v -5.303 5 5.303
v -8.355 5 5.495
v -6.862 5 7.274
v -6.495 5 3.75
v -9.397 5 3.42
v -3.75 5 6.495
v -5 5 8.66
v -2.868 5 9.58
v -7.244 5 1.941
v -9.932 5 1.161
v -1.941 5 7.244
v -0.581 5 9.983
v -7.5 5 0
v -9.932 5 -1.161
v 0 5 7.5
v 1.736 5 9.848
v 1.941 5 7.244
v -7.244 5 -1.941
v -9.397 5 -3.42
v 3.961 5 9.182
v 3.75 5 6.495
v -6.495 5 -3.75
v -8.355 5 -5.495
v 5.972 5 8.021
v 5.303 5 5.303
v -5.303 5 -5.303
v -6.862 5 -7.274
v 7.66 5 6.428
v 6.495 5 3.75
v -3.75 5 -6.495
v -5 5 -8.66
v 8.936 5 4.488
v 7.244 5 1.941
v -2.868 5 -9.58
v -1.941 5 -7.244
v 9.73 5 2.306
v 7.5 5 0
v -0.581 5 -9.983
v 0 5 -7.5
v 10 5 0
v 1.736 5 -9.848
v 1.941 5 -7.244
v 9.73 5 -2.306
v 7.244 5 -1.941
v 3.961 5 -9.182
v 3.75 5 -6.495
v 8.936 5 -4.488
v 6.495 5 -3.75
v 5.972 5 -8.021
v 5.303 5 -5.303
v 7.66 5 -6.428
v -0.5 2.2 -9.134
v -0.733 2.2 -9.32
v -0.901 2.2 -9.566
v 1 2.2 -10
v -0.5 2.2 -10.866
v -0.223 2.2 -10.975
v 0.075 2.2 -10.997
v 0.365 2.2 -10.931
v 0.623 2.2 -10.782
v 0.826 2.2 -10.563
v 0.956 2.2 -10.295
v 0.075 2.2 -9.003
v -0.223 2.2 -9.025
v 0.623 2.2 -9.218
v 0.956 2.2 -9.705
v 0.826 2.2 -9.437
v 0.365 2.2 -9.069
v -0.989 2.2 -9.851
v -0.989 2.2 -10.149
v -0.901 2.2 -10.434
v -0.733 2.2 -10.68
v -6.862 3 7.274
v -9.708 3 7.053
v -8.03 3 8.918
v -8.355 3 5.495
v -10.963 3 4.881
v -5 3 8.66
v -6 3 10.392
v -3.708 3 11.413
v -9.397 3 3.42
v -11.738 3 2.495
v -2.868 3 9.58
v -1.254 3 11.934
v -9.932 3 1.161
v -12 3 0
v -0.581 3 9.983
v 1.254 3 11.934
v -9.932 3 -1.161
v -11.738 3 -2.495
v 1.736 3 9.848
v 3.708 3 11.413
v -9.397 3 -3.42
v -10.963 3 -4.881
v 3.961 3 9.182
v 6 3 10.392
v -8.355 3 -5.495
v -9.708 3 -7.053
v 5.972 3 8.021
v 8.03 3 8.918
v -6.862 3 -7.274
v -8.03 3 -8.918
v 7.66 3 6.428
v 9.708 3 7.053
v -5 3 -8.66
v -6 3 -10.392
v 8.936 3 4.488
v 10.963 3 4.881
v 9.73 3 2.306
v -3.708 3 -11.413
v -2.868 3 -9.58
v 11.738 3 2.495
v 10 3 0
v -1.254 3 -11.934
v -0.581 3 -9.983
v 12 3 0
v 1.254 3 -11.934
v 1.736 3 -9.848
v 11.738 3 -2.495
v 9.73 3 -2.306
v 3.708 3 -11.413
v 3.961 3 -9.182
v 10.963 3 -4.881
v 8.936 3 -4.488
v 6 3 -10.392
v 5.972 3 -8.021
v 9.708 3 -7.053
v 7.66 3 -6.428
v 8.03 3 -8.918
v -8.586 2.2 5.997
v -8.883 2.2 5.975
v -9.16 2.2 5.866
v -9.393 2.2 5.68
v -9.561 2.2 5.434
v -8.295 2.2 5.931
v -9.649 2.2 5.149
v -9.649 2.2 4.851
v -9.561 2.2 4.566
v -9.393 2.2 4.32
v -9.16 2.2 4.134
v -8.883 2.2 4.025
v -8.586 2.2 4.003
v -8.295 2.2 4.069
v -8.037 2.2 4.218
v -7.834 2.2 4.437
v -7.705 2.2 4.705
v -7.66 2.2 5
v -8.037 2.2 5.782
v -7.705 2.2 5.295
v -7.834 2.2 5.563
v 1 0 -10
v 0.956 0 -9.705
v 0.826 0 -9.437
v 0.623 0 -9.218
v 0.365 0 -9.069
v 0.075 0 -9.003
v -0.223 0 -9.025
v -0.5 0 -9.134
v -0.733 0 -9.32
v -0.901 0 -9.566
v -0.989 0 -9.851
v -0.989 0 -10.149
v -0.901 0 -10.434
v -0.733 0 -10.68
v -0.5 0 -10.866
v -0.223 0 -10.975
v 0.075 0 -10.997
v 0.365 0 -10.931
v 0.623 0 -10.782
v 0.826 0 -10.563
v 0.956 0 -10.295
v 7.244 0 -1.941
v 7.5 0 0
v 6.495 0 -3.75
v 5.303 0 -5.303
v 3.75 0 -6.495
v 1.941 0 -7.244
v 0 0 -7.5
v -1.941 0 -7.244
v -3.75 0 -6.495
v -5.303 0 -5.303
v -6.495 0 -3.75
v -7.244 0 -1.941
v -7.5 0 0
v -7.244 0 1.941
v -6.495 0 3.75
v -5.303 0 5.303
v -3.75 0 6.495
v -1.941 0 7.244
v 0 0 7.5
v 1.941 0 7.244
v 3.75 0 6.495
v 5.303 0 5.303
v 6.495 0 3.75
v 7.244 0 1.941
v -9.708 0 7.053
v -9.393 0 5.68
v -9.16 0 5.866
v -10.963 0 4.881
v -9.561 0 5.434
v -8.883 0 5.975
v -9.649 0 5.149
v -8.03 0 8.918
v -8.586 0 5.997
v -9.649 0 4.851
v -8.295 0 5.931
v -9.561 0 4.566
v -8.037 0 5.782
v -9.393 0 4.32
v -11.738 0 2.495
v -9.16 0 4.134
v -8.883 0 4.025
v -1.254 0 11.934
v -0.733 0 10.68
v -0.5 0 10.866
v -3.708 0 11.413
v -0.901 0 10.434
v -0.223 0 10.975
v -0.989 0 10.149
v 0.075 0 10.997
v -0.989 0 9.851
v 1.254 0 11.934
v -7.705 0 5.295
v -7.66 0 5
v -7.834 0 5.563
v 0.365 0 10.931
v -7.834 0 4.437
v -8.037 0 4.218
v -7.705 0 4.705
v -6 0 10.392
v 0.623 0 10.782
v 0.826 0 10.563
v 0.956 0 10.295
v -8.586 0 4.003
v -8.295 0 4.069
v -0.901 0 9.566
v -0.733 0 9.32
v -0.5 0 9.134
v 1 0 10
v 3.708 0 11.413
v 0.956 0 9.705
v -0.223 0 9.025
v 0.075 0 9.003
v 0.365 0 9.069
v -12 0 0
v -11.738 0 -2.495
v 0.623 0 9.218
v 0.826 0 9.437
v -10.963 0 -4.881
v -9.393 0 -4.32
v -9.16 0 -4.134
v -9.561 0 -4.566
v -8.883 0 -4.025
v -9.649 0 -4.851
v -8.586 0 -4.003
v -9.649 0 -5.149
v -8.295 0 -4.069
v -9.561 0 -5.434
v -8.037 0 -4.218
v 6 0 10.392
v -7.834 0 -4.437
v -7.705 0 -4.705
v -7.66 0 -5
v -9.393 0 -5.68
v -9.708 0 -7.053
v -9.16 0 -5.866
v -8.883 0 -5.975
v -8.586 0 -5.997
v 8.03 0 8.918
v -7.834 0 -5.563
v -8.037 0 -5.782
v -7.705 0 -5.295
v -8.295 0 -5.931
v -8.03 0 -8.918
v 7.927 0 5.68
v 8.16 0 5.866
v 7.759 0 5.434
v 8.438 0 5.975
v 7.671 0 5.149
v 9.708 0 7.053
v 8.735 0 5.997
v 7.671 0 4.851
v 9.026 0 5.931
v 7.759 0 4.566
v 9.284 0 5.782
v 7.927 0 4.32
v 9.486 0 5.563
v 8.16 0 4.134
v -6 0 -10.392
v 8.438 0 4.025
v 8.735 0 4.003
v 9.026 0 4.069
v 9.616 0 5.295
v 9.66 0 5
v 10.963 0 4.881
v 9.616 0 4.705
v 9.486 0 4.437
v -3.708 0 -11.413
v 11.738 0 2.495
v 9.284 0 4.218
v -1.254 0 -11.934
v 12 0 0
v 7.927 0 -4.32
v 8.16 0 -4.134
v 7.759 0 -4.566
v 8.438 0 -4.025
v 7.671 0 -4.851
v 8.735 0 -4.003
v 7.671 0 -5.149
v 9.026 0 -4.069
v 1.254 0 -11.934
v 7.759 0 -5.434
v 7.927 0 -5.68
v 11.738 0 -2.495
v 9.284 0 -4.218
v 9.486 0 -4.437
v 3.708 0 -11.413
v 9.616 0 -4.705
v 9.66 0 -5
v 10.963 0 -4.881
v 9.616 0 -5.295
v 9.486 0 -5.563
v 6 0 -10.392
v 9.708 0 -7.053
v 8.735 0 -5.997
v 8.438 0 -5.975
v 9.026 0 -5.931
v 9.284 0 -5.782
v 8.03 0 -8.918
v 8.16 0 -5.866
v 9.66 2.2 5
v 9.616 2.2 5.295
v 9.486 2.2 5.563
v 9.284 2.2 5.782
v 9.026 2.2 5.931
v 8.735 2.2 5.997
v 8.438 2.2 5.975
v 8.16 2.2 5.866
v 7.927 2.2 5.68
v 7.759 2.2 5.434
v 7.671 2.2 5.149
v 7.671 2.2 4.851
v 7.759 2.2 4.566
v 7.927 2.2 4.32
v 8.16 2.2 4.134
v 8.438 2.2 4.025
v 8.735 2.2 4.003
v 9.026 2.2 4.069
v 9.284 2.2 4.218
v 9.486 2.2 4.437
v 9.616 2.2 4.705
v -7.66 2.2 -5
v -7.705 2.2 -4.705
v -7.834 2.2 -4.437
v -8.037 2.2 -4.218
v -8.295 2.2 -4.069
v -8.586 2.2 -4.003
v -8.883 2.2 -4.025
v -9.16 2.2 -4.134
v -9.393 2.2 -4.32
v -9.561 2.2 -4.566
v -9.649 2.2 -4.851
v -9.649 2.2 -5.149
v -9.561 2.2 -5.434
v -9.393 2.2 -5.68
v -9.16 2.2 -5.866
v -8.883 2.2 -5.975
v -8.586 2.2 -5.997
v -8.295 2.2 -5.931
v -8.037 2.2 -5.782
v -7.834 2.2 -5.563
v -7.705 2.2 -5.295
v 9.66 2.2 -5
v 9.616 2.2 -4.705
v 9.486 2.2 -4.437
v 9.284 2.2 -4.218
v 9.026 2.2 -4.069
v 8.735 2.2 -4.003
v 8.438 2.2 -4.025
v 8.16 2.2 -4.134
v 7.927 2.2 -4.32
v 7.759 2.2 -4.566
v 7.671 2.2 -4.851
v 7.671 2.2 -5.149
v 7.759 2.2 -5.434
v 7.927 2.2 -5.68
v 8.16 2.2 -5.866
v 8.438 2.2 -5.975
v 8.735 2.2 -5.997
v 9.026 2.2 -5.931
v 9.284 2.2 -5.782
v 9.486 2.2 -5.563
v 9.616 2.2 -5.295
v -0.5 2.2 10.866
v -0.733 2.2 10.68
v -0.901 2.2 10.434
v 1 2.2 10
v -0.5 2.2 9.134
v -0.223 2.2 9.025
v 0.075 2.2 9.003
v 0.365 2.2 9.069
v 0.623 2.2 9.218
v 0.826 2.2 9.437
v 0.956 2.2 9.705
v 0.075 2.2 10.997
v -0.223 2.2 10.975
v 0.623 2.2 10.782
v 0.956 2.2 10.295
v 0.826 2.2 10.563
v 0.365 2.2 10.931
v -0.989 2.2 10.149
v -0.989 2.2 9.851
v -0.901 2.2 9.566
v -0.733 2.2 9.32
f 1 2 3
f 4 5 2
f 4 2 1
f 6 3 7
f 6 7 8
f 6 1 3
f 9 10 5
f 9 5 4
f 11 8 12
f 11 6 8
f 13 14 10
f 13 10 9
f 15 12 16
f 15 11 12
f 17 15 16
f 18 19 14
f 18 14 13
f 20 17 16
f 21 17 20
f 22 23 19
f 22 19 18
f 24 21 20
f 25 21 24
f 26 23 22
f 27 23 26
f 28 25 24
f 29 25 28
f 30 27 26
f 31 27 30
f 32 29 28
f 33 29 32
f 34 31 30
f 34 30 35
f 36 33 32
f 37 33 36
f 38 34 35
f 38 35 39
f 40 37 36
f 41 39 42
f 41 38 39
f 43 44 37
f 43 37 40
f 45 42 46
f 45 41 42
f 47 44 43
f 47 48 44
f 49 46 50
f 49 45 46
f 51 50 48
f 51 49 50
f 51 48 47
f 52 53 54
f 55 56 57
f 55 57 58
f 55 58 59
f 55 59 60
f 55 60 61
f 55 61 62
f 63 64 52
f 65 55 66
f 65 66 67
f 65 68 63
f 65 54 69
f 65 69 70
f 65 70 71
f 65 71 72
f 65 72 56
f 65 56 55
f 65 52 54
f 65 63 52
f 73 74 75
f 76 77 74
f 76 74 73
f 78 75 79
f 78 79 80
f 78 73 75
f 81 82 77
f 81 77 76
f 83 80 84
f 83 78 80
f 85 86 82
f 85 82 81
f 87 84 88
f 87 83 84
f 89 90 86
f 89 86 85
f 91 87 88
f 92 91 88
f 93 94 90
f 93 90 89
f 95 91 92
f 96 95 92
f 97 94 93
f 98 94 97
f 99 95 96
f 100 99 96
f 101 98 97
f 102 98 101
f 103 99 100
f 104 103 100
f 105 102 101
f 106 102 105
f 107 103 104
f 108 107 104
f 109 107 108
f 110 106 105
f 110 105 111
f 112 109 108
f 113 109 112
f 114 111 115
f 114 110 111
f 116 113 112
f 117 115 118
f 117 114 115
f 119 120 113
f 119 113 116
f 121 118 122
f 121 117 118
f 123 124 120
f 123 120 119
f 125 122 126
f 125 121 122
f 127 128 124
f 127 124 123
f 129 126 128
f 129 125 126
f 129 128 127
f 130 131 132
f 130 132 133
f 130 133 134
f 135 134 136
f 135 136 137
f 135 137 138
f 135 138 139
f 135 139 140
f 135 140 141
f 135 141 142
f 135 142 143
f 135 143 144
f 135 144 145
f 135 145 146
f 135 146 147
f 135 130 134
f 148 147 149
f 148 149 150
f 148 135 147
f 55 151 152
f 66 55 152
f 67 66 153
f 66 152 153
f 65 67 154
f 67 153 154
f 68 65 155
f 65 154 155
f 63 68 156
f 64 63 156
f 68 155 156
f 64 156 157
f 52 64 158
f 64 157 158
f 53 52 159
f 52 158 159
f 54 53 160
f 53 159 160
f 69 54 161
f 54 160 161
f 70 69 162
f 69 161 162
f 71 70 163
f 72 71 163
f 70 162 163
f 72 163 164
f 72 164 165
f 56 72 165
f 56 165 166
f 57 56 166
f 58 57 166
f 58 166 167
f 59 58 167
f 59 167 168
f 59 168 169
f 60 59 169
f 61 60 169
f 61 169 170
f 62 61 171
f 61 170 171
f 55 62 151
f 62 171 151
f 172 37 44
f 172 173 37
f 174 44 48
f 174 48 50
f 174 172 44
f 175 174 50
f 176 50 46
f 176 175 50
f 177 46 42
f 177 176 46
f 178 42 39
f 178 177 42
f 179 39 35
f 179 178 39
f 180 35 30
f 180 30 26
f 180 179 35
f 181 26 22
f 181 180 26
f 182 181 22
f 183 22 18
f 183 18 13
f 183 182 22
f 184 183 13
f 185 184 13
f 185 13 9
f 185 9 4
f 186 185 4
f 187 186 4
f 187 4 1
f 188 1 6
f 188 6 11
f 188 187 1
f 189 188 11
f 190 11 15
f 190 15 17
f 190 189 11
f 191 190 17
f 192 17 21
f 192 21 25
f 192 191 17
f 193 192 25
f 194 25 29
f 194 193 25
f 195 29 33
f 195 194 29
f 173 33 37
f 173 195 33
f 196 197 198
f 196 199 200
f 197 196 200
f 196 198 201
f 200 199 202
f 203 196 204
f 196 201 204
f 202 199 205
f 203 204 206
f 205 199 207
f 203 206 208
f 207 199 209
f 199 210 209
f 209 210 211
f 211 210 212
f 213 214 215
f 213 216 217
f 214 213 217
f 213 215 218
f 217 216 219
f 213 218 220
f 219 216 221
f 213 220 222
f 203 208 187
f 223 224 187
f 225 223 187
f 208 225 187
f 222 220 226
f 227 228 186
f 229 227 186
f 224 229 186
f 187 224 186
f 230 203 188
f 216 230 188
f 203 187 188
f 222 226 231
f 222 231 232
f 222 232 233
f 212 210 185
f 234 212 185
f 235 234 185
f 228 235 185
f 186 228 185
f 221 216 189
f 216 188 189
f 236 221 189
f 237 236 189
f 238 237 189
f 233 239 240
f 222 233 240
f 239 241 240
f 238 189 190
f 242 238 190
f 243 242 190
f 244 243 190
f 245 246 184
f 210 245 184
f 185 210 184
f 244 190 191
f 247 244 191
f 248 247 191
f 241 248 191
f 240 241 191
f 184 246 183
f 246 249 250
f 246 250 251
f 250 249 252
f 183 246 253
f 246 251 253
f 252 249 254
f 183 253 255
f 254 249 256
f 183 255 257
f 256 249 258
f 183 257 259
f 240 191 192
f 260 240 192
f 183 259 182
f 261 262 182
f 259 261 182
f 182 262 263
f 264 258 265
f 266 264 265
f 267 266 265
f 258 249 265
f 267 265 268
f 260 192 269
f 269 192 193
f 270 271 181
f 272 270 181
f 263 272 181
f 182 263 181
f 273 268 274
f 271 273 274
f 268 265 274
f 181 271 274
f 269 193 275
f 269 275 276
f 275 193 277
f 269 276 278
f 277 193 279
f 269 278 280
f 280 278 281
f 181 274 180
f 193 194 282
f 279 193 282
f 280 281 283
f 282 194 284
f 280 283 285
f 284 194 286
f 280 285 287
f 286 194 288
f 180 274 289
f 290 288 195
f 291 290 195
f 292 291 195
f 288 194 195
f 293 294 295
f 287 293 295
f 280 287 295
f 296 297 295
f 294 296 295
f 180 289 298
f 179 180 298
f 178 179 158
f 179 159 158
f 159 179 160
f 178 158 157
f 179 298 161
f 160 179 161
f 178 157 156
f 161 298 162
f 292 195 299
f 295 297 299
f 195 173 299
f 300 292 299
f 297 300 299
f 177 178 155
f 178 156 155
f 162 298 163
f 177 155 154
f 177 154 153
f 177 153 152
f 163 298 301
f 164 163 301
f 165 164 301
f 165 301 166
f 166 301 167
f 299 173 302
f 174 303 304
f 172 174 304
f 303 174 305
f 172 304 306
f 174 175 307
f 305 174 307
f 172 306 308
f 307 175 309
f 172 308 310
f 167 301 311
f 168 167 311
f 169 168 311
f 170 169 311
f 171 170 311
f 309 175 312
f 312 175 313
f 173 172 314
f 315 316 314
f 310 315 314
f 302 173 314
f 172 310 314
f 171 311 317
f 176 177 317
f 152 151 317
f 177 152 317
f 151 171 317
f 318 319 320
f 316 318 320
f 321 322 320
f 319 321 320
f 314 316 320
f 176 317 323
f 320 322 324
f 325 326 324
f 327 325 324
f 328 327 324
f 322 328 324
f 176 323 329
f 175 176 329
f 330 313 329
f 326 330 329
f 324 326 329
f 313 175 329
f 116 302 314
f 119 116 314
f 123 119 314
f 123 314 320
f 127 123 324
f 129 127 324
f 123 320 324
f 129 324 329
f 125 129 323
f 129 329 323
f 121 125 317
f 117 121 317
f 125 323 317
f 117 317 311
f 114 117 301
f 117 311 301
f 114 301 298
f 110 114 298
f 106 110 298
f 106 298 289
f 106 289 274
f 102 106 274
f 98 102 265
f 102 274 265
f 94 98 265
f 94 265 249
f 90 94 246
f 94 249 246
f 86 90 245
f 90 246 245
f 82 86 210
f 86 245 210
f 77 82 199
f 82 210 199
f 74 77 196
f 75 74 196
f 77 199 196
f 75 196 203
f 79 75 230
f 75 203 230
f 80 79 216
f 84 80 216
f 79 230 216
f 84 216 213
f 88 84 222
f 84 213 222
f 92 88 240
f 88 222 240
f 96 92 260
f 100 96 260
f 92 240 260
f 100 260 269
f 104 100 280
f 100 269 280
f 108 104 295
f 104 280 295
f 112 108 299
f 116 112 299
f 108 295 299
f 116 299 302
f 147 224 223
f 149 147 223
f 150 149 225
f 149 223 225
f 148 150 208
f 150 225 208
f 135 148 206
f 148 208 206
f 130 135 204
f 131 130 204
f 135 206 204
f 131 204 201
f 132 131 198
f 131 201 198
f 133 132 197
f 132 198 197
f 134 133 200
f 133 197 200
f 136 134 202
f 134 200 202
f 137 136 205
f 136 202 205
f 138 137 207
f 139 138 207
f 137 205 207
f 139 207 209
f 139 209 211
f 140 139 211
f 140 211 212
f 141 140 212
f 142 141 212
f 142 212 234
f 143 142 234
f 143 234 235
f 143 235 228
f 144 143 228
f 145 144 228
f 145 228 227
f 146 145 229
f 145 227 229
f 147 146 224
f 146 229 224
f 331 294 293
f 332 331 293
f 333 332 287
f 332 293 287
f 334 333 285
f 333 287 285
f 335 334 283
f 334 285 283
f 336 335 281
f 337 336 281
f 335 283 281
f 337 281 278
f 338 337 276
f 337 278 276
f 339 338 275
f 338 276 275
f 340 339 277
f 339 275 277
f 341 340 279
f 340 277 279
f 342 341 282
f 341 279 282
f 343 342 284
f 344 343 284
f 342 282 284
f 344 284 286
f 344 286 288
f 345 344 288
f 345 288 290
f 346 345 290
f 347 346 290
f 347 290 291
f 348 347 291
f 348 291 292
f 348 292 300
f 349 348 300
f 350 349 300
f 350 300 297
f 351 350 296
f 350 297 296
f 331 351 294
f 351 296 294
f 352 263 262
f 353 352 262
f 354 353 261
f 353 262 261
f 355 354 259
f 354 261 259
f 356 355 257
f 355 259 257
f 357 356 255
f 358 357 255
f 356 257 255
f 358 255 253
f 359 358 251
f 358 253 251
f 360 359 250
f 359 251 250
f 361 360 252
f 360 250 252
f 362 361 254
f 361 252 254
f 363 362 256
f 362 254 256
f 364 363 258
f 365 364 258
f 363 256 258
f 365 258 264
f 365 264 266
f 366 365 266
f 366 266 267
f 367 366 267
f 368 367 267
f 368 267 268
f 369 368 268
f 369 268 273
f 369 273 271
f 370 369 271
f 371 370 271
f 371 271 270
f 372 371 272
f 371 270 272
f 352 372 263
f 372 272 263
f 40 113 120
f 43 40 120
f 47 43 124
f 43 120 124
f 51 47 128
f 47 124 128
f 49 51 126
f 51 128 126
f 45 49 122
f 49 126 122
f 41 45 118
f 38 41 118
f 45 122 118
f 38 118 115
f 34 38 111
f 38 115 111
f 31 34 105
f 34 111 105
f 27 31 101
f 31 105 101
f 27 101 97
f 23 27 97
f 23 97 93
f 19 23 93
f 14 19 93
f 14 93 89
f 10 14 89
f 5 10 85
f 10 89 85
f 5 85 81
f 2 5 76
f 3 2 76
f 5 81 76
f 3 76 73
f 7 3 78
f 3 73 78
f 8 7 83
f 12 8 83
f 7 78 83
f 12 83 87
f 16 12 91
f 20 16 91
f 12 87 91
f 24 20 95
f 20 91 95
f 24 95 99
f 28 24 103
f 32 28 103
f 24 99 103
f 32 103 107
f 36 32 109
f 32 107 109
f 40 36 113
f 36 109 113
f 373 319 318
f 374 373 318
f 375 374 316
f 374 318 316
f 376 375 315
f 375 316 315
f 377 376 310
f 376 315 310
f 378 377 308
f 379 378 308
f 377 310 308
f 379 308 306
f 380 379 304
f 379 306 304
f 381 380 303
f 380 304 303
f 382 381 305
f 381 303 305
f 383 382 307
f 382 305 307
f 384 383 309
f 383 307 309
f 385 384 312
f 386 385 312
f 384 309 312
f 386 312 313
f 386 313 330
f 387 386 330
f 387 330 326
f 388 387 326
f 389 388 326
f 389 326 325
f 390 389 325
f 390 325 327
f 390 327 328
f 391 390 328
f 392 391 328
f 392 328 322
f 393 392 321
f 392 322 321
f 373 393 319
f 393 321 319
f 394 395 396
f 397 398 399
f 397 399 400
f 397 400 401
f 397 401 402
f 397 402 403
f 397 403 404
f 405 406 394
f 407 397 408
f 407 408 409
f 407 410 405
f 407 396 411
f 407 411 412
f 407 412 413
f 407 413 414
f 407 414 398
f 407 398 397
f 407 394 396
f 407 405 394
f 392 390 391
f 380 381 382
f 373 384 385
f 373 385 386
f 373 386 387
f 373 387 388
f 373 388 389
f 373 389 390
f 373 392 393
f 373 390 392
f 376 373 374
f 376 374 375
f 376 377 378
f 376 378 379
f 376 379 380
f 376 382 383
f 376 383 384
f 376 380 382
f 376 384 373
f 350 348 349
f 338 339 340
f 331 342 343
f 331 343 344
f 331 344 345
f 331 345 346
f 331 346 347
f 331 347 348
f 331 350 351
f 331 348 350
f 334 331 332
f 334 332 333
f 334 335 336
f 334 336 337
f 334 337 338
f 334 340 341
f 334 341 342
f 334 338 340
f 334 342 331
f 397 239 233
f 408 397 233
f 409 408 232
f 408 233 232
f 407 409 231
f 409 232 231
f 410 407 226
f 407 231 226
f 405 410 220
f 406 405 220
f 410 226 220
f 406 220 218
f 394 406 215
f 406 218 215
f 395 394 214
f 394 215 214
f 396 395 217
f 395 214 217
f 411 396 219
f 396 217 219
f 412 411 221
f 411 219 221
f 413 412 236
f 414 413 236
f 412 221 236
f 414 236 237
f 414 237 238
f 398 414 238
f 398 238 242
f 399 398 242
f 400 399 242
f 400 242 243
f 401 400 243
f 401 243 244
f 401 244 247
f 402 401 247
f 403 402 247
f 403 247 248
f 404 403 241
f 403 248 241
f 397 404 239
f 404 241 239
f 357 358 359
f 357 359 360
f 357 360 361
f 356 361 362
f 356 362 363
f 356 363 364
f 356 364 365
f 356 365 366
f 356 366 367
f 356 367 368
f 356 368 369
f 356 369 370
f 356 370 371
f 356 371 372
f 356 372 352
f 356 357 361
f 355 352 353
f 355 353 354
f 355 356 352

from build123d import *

# Parameters (mm, degrees)
SKETCH1_R           = 12
SKETCH1_R_2         = 7.5
BOSS_EXTRUDE1_DEPTH = 3
SKETCH2_R           = 1
CUT_EXTRUDE1_DEPTH  = 2.2
SKETCH3_R           = 10
SKETCH3_R_2         = 7.5
BOSS_EXTRUDE2_DEPTH = 2


with BuildPart() as part:
    # Sketch1 → Boss-Extrude1 (new body)
    with BuildSketch(Plane(origin=(0, 0, 0), x_dir=(1, 0, 0), z_dir=(0, 1, 0))):
        Circle(SKETCH1_R)
        Circle(SKETCH1_R_2, mode=Mode.SUBTRACT)
    extrude(amount=BOSS_EXTRUDE1_DEPTH)

    # Sketch2 → Cut-Extrude1 (cut)
    with BuildSketch(Plane.XZ):
        with Locations((0, 10)):
            Circle(SKETCH2_R)
        with Locations((-8.660254038, 5)):
            Circle(SKETCH2_R)
        with Locations((-8.660254038, -5)):
            Circle(SKETCH2_R)
        with Locations((0, -10)):
            Circle(SKETCH2_R)
        with Locations((8.660254038, -5)):
            Circle(SKETCH2_R)
        with Locations((8.660254038, 5)):
            Circle(SKETCH2_R)
    extrude(amount=-CUT_EXTRUDE1_DEPTH, mode=Mode.SUBTRACT)

    # Sketch3 → Boss-Extrude2 (add)
    with BuildSketch(Plane(origin=(0, 3, 0), x_dir=(1, 0, 0), z_dir=(0, 1, 0))):
        Circle(SKETCH3_R)
        Circle(SKETCH3_R_2, mode=Mode.SUBTRACT)
    extrude(amount=BOSS_EXTRUDE2_DEPTH)


solid = part.part
